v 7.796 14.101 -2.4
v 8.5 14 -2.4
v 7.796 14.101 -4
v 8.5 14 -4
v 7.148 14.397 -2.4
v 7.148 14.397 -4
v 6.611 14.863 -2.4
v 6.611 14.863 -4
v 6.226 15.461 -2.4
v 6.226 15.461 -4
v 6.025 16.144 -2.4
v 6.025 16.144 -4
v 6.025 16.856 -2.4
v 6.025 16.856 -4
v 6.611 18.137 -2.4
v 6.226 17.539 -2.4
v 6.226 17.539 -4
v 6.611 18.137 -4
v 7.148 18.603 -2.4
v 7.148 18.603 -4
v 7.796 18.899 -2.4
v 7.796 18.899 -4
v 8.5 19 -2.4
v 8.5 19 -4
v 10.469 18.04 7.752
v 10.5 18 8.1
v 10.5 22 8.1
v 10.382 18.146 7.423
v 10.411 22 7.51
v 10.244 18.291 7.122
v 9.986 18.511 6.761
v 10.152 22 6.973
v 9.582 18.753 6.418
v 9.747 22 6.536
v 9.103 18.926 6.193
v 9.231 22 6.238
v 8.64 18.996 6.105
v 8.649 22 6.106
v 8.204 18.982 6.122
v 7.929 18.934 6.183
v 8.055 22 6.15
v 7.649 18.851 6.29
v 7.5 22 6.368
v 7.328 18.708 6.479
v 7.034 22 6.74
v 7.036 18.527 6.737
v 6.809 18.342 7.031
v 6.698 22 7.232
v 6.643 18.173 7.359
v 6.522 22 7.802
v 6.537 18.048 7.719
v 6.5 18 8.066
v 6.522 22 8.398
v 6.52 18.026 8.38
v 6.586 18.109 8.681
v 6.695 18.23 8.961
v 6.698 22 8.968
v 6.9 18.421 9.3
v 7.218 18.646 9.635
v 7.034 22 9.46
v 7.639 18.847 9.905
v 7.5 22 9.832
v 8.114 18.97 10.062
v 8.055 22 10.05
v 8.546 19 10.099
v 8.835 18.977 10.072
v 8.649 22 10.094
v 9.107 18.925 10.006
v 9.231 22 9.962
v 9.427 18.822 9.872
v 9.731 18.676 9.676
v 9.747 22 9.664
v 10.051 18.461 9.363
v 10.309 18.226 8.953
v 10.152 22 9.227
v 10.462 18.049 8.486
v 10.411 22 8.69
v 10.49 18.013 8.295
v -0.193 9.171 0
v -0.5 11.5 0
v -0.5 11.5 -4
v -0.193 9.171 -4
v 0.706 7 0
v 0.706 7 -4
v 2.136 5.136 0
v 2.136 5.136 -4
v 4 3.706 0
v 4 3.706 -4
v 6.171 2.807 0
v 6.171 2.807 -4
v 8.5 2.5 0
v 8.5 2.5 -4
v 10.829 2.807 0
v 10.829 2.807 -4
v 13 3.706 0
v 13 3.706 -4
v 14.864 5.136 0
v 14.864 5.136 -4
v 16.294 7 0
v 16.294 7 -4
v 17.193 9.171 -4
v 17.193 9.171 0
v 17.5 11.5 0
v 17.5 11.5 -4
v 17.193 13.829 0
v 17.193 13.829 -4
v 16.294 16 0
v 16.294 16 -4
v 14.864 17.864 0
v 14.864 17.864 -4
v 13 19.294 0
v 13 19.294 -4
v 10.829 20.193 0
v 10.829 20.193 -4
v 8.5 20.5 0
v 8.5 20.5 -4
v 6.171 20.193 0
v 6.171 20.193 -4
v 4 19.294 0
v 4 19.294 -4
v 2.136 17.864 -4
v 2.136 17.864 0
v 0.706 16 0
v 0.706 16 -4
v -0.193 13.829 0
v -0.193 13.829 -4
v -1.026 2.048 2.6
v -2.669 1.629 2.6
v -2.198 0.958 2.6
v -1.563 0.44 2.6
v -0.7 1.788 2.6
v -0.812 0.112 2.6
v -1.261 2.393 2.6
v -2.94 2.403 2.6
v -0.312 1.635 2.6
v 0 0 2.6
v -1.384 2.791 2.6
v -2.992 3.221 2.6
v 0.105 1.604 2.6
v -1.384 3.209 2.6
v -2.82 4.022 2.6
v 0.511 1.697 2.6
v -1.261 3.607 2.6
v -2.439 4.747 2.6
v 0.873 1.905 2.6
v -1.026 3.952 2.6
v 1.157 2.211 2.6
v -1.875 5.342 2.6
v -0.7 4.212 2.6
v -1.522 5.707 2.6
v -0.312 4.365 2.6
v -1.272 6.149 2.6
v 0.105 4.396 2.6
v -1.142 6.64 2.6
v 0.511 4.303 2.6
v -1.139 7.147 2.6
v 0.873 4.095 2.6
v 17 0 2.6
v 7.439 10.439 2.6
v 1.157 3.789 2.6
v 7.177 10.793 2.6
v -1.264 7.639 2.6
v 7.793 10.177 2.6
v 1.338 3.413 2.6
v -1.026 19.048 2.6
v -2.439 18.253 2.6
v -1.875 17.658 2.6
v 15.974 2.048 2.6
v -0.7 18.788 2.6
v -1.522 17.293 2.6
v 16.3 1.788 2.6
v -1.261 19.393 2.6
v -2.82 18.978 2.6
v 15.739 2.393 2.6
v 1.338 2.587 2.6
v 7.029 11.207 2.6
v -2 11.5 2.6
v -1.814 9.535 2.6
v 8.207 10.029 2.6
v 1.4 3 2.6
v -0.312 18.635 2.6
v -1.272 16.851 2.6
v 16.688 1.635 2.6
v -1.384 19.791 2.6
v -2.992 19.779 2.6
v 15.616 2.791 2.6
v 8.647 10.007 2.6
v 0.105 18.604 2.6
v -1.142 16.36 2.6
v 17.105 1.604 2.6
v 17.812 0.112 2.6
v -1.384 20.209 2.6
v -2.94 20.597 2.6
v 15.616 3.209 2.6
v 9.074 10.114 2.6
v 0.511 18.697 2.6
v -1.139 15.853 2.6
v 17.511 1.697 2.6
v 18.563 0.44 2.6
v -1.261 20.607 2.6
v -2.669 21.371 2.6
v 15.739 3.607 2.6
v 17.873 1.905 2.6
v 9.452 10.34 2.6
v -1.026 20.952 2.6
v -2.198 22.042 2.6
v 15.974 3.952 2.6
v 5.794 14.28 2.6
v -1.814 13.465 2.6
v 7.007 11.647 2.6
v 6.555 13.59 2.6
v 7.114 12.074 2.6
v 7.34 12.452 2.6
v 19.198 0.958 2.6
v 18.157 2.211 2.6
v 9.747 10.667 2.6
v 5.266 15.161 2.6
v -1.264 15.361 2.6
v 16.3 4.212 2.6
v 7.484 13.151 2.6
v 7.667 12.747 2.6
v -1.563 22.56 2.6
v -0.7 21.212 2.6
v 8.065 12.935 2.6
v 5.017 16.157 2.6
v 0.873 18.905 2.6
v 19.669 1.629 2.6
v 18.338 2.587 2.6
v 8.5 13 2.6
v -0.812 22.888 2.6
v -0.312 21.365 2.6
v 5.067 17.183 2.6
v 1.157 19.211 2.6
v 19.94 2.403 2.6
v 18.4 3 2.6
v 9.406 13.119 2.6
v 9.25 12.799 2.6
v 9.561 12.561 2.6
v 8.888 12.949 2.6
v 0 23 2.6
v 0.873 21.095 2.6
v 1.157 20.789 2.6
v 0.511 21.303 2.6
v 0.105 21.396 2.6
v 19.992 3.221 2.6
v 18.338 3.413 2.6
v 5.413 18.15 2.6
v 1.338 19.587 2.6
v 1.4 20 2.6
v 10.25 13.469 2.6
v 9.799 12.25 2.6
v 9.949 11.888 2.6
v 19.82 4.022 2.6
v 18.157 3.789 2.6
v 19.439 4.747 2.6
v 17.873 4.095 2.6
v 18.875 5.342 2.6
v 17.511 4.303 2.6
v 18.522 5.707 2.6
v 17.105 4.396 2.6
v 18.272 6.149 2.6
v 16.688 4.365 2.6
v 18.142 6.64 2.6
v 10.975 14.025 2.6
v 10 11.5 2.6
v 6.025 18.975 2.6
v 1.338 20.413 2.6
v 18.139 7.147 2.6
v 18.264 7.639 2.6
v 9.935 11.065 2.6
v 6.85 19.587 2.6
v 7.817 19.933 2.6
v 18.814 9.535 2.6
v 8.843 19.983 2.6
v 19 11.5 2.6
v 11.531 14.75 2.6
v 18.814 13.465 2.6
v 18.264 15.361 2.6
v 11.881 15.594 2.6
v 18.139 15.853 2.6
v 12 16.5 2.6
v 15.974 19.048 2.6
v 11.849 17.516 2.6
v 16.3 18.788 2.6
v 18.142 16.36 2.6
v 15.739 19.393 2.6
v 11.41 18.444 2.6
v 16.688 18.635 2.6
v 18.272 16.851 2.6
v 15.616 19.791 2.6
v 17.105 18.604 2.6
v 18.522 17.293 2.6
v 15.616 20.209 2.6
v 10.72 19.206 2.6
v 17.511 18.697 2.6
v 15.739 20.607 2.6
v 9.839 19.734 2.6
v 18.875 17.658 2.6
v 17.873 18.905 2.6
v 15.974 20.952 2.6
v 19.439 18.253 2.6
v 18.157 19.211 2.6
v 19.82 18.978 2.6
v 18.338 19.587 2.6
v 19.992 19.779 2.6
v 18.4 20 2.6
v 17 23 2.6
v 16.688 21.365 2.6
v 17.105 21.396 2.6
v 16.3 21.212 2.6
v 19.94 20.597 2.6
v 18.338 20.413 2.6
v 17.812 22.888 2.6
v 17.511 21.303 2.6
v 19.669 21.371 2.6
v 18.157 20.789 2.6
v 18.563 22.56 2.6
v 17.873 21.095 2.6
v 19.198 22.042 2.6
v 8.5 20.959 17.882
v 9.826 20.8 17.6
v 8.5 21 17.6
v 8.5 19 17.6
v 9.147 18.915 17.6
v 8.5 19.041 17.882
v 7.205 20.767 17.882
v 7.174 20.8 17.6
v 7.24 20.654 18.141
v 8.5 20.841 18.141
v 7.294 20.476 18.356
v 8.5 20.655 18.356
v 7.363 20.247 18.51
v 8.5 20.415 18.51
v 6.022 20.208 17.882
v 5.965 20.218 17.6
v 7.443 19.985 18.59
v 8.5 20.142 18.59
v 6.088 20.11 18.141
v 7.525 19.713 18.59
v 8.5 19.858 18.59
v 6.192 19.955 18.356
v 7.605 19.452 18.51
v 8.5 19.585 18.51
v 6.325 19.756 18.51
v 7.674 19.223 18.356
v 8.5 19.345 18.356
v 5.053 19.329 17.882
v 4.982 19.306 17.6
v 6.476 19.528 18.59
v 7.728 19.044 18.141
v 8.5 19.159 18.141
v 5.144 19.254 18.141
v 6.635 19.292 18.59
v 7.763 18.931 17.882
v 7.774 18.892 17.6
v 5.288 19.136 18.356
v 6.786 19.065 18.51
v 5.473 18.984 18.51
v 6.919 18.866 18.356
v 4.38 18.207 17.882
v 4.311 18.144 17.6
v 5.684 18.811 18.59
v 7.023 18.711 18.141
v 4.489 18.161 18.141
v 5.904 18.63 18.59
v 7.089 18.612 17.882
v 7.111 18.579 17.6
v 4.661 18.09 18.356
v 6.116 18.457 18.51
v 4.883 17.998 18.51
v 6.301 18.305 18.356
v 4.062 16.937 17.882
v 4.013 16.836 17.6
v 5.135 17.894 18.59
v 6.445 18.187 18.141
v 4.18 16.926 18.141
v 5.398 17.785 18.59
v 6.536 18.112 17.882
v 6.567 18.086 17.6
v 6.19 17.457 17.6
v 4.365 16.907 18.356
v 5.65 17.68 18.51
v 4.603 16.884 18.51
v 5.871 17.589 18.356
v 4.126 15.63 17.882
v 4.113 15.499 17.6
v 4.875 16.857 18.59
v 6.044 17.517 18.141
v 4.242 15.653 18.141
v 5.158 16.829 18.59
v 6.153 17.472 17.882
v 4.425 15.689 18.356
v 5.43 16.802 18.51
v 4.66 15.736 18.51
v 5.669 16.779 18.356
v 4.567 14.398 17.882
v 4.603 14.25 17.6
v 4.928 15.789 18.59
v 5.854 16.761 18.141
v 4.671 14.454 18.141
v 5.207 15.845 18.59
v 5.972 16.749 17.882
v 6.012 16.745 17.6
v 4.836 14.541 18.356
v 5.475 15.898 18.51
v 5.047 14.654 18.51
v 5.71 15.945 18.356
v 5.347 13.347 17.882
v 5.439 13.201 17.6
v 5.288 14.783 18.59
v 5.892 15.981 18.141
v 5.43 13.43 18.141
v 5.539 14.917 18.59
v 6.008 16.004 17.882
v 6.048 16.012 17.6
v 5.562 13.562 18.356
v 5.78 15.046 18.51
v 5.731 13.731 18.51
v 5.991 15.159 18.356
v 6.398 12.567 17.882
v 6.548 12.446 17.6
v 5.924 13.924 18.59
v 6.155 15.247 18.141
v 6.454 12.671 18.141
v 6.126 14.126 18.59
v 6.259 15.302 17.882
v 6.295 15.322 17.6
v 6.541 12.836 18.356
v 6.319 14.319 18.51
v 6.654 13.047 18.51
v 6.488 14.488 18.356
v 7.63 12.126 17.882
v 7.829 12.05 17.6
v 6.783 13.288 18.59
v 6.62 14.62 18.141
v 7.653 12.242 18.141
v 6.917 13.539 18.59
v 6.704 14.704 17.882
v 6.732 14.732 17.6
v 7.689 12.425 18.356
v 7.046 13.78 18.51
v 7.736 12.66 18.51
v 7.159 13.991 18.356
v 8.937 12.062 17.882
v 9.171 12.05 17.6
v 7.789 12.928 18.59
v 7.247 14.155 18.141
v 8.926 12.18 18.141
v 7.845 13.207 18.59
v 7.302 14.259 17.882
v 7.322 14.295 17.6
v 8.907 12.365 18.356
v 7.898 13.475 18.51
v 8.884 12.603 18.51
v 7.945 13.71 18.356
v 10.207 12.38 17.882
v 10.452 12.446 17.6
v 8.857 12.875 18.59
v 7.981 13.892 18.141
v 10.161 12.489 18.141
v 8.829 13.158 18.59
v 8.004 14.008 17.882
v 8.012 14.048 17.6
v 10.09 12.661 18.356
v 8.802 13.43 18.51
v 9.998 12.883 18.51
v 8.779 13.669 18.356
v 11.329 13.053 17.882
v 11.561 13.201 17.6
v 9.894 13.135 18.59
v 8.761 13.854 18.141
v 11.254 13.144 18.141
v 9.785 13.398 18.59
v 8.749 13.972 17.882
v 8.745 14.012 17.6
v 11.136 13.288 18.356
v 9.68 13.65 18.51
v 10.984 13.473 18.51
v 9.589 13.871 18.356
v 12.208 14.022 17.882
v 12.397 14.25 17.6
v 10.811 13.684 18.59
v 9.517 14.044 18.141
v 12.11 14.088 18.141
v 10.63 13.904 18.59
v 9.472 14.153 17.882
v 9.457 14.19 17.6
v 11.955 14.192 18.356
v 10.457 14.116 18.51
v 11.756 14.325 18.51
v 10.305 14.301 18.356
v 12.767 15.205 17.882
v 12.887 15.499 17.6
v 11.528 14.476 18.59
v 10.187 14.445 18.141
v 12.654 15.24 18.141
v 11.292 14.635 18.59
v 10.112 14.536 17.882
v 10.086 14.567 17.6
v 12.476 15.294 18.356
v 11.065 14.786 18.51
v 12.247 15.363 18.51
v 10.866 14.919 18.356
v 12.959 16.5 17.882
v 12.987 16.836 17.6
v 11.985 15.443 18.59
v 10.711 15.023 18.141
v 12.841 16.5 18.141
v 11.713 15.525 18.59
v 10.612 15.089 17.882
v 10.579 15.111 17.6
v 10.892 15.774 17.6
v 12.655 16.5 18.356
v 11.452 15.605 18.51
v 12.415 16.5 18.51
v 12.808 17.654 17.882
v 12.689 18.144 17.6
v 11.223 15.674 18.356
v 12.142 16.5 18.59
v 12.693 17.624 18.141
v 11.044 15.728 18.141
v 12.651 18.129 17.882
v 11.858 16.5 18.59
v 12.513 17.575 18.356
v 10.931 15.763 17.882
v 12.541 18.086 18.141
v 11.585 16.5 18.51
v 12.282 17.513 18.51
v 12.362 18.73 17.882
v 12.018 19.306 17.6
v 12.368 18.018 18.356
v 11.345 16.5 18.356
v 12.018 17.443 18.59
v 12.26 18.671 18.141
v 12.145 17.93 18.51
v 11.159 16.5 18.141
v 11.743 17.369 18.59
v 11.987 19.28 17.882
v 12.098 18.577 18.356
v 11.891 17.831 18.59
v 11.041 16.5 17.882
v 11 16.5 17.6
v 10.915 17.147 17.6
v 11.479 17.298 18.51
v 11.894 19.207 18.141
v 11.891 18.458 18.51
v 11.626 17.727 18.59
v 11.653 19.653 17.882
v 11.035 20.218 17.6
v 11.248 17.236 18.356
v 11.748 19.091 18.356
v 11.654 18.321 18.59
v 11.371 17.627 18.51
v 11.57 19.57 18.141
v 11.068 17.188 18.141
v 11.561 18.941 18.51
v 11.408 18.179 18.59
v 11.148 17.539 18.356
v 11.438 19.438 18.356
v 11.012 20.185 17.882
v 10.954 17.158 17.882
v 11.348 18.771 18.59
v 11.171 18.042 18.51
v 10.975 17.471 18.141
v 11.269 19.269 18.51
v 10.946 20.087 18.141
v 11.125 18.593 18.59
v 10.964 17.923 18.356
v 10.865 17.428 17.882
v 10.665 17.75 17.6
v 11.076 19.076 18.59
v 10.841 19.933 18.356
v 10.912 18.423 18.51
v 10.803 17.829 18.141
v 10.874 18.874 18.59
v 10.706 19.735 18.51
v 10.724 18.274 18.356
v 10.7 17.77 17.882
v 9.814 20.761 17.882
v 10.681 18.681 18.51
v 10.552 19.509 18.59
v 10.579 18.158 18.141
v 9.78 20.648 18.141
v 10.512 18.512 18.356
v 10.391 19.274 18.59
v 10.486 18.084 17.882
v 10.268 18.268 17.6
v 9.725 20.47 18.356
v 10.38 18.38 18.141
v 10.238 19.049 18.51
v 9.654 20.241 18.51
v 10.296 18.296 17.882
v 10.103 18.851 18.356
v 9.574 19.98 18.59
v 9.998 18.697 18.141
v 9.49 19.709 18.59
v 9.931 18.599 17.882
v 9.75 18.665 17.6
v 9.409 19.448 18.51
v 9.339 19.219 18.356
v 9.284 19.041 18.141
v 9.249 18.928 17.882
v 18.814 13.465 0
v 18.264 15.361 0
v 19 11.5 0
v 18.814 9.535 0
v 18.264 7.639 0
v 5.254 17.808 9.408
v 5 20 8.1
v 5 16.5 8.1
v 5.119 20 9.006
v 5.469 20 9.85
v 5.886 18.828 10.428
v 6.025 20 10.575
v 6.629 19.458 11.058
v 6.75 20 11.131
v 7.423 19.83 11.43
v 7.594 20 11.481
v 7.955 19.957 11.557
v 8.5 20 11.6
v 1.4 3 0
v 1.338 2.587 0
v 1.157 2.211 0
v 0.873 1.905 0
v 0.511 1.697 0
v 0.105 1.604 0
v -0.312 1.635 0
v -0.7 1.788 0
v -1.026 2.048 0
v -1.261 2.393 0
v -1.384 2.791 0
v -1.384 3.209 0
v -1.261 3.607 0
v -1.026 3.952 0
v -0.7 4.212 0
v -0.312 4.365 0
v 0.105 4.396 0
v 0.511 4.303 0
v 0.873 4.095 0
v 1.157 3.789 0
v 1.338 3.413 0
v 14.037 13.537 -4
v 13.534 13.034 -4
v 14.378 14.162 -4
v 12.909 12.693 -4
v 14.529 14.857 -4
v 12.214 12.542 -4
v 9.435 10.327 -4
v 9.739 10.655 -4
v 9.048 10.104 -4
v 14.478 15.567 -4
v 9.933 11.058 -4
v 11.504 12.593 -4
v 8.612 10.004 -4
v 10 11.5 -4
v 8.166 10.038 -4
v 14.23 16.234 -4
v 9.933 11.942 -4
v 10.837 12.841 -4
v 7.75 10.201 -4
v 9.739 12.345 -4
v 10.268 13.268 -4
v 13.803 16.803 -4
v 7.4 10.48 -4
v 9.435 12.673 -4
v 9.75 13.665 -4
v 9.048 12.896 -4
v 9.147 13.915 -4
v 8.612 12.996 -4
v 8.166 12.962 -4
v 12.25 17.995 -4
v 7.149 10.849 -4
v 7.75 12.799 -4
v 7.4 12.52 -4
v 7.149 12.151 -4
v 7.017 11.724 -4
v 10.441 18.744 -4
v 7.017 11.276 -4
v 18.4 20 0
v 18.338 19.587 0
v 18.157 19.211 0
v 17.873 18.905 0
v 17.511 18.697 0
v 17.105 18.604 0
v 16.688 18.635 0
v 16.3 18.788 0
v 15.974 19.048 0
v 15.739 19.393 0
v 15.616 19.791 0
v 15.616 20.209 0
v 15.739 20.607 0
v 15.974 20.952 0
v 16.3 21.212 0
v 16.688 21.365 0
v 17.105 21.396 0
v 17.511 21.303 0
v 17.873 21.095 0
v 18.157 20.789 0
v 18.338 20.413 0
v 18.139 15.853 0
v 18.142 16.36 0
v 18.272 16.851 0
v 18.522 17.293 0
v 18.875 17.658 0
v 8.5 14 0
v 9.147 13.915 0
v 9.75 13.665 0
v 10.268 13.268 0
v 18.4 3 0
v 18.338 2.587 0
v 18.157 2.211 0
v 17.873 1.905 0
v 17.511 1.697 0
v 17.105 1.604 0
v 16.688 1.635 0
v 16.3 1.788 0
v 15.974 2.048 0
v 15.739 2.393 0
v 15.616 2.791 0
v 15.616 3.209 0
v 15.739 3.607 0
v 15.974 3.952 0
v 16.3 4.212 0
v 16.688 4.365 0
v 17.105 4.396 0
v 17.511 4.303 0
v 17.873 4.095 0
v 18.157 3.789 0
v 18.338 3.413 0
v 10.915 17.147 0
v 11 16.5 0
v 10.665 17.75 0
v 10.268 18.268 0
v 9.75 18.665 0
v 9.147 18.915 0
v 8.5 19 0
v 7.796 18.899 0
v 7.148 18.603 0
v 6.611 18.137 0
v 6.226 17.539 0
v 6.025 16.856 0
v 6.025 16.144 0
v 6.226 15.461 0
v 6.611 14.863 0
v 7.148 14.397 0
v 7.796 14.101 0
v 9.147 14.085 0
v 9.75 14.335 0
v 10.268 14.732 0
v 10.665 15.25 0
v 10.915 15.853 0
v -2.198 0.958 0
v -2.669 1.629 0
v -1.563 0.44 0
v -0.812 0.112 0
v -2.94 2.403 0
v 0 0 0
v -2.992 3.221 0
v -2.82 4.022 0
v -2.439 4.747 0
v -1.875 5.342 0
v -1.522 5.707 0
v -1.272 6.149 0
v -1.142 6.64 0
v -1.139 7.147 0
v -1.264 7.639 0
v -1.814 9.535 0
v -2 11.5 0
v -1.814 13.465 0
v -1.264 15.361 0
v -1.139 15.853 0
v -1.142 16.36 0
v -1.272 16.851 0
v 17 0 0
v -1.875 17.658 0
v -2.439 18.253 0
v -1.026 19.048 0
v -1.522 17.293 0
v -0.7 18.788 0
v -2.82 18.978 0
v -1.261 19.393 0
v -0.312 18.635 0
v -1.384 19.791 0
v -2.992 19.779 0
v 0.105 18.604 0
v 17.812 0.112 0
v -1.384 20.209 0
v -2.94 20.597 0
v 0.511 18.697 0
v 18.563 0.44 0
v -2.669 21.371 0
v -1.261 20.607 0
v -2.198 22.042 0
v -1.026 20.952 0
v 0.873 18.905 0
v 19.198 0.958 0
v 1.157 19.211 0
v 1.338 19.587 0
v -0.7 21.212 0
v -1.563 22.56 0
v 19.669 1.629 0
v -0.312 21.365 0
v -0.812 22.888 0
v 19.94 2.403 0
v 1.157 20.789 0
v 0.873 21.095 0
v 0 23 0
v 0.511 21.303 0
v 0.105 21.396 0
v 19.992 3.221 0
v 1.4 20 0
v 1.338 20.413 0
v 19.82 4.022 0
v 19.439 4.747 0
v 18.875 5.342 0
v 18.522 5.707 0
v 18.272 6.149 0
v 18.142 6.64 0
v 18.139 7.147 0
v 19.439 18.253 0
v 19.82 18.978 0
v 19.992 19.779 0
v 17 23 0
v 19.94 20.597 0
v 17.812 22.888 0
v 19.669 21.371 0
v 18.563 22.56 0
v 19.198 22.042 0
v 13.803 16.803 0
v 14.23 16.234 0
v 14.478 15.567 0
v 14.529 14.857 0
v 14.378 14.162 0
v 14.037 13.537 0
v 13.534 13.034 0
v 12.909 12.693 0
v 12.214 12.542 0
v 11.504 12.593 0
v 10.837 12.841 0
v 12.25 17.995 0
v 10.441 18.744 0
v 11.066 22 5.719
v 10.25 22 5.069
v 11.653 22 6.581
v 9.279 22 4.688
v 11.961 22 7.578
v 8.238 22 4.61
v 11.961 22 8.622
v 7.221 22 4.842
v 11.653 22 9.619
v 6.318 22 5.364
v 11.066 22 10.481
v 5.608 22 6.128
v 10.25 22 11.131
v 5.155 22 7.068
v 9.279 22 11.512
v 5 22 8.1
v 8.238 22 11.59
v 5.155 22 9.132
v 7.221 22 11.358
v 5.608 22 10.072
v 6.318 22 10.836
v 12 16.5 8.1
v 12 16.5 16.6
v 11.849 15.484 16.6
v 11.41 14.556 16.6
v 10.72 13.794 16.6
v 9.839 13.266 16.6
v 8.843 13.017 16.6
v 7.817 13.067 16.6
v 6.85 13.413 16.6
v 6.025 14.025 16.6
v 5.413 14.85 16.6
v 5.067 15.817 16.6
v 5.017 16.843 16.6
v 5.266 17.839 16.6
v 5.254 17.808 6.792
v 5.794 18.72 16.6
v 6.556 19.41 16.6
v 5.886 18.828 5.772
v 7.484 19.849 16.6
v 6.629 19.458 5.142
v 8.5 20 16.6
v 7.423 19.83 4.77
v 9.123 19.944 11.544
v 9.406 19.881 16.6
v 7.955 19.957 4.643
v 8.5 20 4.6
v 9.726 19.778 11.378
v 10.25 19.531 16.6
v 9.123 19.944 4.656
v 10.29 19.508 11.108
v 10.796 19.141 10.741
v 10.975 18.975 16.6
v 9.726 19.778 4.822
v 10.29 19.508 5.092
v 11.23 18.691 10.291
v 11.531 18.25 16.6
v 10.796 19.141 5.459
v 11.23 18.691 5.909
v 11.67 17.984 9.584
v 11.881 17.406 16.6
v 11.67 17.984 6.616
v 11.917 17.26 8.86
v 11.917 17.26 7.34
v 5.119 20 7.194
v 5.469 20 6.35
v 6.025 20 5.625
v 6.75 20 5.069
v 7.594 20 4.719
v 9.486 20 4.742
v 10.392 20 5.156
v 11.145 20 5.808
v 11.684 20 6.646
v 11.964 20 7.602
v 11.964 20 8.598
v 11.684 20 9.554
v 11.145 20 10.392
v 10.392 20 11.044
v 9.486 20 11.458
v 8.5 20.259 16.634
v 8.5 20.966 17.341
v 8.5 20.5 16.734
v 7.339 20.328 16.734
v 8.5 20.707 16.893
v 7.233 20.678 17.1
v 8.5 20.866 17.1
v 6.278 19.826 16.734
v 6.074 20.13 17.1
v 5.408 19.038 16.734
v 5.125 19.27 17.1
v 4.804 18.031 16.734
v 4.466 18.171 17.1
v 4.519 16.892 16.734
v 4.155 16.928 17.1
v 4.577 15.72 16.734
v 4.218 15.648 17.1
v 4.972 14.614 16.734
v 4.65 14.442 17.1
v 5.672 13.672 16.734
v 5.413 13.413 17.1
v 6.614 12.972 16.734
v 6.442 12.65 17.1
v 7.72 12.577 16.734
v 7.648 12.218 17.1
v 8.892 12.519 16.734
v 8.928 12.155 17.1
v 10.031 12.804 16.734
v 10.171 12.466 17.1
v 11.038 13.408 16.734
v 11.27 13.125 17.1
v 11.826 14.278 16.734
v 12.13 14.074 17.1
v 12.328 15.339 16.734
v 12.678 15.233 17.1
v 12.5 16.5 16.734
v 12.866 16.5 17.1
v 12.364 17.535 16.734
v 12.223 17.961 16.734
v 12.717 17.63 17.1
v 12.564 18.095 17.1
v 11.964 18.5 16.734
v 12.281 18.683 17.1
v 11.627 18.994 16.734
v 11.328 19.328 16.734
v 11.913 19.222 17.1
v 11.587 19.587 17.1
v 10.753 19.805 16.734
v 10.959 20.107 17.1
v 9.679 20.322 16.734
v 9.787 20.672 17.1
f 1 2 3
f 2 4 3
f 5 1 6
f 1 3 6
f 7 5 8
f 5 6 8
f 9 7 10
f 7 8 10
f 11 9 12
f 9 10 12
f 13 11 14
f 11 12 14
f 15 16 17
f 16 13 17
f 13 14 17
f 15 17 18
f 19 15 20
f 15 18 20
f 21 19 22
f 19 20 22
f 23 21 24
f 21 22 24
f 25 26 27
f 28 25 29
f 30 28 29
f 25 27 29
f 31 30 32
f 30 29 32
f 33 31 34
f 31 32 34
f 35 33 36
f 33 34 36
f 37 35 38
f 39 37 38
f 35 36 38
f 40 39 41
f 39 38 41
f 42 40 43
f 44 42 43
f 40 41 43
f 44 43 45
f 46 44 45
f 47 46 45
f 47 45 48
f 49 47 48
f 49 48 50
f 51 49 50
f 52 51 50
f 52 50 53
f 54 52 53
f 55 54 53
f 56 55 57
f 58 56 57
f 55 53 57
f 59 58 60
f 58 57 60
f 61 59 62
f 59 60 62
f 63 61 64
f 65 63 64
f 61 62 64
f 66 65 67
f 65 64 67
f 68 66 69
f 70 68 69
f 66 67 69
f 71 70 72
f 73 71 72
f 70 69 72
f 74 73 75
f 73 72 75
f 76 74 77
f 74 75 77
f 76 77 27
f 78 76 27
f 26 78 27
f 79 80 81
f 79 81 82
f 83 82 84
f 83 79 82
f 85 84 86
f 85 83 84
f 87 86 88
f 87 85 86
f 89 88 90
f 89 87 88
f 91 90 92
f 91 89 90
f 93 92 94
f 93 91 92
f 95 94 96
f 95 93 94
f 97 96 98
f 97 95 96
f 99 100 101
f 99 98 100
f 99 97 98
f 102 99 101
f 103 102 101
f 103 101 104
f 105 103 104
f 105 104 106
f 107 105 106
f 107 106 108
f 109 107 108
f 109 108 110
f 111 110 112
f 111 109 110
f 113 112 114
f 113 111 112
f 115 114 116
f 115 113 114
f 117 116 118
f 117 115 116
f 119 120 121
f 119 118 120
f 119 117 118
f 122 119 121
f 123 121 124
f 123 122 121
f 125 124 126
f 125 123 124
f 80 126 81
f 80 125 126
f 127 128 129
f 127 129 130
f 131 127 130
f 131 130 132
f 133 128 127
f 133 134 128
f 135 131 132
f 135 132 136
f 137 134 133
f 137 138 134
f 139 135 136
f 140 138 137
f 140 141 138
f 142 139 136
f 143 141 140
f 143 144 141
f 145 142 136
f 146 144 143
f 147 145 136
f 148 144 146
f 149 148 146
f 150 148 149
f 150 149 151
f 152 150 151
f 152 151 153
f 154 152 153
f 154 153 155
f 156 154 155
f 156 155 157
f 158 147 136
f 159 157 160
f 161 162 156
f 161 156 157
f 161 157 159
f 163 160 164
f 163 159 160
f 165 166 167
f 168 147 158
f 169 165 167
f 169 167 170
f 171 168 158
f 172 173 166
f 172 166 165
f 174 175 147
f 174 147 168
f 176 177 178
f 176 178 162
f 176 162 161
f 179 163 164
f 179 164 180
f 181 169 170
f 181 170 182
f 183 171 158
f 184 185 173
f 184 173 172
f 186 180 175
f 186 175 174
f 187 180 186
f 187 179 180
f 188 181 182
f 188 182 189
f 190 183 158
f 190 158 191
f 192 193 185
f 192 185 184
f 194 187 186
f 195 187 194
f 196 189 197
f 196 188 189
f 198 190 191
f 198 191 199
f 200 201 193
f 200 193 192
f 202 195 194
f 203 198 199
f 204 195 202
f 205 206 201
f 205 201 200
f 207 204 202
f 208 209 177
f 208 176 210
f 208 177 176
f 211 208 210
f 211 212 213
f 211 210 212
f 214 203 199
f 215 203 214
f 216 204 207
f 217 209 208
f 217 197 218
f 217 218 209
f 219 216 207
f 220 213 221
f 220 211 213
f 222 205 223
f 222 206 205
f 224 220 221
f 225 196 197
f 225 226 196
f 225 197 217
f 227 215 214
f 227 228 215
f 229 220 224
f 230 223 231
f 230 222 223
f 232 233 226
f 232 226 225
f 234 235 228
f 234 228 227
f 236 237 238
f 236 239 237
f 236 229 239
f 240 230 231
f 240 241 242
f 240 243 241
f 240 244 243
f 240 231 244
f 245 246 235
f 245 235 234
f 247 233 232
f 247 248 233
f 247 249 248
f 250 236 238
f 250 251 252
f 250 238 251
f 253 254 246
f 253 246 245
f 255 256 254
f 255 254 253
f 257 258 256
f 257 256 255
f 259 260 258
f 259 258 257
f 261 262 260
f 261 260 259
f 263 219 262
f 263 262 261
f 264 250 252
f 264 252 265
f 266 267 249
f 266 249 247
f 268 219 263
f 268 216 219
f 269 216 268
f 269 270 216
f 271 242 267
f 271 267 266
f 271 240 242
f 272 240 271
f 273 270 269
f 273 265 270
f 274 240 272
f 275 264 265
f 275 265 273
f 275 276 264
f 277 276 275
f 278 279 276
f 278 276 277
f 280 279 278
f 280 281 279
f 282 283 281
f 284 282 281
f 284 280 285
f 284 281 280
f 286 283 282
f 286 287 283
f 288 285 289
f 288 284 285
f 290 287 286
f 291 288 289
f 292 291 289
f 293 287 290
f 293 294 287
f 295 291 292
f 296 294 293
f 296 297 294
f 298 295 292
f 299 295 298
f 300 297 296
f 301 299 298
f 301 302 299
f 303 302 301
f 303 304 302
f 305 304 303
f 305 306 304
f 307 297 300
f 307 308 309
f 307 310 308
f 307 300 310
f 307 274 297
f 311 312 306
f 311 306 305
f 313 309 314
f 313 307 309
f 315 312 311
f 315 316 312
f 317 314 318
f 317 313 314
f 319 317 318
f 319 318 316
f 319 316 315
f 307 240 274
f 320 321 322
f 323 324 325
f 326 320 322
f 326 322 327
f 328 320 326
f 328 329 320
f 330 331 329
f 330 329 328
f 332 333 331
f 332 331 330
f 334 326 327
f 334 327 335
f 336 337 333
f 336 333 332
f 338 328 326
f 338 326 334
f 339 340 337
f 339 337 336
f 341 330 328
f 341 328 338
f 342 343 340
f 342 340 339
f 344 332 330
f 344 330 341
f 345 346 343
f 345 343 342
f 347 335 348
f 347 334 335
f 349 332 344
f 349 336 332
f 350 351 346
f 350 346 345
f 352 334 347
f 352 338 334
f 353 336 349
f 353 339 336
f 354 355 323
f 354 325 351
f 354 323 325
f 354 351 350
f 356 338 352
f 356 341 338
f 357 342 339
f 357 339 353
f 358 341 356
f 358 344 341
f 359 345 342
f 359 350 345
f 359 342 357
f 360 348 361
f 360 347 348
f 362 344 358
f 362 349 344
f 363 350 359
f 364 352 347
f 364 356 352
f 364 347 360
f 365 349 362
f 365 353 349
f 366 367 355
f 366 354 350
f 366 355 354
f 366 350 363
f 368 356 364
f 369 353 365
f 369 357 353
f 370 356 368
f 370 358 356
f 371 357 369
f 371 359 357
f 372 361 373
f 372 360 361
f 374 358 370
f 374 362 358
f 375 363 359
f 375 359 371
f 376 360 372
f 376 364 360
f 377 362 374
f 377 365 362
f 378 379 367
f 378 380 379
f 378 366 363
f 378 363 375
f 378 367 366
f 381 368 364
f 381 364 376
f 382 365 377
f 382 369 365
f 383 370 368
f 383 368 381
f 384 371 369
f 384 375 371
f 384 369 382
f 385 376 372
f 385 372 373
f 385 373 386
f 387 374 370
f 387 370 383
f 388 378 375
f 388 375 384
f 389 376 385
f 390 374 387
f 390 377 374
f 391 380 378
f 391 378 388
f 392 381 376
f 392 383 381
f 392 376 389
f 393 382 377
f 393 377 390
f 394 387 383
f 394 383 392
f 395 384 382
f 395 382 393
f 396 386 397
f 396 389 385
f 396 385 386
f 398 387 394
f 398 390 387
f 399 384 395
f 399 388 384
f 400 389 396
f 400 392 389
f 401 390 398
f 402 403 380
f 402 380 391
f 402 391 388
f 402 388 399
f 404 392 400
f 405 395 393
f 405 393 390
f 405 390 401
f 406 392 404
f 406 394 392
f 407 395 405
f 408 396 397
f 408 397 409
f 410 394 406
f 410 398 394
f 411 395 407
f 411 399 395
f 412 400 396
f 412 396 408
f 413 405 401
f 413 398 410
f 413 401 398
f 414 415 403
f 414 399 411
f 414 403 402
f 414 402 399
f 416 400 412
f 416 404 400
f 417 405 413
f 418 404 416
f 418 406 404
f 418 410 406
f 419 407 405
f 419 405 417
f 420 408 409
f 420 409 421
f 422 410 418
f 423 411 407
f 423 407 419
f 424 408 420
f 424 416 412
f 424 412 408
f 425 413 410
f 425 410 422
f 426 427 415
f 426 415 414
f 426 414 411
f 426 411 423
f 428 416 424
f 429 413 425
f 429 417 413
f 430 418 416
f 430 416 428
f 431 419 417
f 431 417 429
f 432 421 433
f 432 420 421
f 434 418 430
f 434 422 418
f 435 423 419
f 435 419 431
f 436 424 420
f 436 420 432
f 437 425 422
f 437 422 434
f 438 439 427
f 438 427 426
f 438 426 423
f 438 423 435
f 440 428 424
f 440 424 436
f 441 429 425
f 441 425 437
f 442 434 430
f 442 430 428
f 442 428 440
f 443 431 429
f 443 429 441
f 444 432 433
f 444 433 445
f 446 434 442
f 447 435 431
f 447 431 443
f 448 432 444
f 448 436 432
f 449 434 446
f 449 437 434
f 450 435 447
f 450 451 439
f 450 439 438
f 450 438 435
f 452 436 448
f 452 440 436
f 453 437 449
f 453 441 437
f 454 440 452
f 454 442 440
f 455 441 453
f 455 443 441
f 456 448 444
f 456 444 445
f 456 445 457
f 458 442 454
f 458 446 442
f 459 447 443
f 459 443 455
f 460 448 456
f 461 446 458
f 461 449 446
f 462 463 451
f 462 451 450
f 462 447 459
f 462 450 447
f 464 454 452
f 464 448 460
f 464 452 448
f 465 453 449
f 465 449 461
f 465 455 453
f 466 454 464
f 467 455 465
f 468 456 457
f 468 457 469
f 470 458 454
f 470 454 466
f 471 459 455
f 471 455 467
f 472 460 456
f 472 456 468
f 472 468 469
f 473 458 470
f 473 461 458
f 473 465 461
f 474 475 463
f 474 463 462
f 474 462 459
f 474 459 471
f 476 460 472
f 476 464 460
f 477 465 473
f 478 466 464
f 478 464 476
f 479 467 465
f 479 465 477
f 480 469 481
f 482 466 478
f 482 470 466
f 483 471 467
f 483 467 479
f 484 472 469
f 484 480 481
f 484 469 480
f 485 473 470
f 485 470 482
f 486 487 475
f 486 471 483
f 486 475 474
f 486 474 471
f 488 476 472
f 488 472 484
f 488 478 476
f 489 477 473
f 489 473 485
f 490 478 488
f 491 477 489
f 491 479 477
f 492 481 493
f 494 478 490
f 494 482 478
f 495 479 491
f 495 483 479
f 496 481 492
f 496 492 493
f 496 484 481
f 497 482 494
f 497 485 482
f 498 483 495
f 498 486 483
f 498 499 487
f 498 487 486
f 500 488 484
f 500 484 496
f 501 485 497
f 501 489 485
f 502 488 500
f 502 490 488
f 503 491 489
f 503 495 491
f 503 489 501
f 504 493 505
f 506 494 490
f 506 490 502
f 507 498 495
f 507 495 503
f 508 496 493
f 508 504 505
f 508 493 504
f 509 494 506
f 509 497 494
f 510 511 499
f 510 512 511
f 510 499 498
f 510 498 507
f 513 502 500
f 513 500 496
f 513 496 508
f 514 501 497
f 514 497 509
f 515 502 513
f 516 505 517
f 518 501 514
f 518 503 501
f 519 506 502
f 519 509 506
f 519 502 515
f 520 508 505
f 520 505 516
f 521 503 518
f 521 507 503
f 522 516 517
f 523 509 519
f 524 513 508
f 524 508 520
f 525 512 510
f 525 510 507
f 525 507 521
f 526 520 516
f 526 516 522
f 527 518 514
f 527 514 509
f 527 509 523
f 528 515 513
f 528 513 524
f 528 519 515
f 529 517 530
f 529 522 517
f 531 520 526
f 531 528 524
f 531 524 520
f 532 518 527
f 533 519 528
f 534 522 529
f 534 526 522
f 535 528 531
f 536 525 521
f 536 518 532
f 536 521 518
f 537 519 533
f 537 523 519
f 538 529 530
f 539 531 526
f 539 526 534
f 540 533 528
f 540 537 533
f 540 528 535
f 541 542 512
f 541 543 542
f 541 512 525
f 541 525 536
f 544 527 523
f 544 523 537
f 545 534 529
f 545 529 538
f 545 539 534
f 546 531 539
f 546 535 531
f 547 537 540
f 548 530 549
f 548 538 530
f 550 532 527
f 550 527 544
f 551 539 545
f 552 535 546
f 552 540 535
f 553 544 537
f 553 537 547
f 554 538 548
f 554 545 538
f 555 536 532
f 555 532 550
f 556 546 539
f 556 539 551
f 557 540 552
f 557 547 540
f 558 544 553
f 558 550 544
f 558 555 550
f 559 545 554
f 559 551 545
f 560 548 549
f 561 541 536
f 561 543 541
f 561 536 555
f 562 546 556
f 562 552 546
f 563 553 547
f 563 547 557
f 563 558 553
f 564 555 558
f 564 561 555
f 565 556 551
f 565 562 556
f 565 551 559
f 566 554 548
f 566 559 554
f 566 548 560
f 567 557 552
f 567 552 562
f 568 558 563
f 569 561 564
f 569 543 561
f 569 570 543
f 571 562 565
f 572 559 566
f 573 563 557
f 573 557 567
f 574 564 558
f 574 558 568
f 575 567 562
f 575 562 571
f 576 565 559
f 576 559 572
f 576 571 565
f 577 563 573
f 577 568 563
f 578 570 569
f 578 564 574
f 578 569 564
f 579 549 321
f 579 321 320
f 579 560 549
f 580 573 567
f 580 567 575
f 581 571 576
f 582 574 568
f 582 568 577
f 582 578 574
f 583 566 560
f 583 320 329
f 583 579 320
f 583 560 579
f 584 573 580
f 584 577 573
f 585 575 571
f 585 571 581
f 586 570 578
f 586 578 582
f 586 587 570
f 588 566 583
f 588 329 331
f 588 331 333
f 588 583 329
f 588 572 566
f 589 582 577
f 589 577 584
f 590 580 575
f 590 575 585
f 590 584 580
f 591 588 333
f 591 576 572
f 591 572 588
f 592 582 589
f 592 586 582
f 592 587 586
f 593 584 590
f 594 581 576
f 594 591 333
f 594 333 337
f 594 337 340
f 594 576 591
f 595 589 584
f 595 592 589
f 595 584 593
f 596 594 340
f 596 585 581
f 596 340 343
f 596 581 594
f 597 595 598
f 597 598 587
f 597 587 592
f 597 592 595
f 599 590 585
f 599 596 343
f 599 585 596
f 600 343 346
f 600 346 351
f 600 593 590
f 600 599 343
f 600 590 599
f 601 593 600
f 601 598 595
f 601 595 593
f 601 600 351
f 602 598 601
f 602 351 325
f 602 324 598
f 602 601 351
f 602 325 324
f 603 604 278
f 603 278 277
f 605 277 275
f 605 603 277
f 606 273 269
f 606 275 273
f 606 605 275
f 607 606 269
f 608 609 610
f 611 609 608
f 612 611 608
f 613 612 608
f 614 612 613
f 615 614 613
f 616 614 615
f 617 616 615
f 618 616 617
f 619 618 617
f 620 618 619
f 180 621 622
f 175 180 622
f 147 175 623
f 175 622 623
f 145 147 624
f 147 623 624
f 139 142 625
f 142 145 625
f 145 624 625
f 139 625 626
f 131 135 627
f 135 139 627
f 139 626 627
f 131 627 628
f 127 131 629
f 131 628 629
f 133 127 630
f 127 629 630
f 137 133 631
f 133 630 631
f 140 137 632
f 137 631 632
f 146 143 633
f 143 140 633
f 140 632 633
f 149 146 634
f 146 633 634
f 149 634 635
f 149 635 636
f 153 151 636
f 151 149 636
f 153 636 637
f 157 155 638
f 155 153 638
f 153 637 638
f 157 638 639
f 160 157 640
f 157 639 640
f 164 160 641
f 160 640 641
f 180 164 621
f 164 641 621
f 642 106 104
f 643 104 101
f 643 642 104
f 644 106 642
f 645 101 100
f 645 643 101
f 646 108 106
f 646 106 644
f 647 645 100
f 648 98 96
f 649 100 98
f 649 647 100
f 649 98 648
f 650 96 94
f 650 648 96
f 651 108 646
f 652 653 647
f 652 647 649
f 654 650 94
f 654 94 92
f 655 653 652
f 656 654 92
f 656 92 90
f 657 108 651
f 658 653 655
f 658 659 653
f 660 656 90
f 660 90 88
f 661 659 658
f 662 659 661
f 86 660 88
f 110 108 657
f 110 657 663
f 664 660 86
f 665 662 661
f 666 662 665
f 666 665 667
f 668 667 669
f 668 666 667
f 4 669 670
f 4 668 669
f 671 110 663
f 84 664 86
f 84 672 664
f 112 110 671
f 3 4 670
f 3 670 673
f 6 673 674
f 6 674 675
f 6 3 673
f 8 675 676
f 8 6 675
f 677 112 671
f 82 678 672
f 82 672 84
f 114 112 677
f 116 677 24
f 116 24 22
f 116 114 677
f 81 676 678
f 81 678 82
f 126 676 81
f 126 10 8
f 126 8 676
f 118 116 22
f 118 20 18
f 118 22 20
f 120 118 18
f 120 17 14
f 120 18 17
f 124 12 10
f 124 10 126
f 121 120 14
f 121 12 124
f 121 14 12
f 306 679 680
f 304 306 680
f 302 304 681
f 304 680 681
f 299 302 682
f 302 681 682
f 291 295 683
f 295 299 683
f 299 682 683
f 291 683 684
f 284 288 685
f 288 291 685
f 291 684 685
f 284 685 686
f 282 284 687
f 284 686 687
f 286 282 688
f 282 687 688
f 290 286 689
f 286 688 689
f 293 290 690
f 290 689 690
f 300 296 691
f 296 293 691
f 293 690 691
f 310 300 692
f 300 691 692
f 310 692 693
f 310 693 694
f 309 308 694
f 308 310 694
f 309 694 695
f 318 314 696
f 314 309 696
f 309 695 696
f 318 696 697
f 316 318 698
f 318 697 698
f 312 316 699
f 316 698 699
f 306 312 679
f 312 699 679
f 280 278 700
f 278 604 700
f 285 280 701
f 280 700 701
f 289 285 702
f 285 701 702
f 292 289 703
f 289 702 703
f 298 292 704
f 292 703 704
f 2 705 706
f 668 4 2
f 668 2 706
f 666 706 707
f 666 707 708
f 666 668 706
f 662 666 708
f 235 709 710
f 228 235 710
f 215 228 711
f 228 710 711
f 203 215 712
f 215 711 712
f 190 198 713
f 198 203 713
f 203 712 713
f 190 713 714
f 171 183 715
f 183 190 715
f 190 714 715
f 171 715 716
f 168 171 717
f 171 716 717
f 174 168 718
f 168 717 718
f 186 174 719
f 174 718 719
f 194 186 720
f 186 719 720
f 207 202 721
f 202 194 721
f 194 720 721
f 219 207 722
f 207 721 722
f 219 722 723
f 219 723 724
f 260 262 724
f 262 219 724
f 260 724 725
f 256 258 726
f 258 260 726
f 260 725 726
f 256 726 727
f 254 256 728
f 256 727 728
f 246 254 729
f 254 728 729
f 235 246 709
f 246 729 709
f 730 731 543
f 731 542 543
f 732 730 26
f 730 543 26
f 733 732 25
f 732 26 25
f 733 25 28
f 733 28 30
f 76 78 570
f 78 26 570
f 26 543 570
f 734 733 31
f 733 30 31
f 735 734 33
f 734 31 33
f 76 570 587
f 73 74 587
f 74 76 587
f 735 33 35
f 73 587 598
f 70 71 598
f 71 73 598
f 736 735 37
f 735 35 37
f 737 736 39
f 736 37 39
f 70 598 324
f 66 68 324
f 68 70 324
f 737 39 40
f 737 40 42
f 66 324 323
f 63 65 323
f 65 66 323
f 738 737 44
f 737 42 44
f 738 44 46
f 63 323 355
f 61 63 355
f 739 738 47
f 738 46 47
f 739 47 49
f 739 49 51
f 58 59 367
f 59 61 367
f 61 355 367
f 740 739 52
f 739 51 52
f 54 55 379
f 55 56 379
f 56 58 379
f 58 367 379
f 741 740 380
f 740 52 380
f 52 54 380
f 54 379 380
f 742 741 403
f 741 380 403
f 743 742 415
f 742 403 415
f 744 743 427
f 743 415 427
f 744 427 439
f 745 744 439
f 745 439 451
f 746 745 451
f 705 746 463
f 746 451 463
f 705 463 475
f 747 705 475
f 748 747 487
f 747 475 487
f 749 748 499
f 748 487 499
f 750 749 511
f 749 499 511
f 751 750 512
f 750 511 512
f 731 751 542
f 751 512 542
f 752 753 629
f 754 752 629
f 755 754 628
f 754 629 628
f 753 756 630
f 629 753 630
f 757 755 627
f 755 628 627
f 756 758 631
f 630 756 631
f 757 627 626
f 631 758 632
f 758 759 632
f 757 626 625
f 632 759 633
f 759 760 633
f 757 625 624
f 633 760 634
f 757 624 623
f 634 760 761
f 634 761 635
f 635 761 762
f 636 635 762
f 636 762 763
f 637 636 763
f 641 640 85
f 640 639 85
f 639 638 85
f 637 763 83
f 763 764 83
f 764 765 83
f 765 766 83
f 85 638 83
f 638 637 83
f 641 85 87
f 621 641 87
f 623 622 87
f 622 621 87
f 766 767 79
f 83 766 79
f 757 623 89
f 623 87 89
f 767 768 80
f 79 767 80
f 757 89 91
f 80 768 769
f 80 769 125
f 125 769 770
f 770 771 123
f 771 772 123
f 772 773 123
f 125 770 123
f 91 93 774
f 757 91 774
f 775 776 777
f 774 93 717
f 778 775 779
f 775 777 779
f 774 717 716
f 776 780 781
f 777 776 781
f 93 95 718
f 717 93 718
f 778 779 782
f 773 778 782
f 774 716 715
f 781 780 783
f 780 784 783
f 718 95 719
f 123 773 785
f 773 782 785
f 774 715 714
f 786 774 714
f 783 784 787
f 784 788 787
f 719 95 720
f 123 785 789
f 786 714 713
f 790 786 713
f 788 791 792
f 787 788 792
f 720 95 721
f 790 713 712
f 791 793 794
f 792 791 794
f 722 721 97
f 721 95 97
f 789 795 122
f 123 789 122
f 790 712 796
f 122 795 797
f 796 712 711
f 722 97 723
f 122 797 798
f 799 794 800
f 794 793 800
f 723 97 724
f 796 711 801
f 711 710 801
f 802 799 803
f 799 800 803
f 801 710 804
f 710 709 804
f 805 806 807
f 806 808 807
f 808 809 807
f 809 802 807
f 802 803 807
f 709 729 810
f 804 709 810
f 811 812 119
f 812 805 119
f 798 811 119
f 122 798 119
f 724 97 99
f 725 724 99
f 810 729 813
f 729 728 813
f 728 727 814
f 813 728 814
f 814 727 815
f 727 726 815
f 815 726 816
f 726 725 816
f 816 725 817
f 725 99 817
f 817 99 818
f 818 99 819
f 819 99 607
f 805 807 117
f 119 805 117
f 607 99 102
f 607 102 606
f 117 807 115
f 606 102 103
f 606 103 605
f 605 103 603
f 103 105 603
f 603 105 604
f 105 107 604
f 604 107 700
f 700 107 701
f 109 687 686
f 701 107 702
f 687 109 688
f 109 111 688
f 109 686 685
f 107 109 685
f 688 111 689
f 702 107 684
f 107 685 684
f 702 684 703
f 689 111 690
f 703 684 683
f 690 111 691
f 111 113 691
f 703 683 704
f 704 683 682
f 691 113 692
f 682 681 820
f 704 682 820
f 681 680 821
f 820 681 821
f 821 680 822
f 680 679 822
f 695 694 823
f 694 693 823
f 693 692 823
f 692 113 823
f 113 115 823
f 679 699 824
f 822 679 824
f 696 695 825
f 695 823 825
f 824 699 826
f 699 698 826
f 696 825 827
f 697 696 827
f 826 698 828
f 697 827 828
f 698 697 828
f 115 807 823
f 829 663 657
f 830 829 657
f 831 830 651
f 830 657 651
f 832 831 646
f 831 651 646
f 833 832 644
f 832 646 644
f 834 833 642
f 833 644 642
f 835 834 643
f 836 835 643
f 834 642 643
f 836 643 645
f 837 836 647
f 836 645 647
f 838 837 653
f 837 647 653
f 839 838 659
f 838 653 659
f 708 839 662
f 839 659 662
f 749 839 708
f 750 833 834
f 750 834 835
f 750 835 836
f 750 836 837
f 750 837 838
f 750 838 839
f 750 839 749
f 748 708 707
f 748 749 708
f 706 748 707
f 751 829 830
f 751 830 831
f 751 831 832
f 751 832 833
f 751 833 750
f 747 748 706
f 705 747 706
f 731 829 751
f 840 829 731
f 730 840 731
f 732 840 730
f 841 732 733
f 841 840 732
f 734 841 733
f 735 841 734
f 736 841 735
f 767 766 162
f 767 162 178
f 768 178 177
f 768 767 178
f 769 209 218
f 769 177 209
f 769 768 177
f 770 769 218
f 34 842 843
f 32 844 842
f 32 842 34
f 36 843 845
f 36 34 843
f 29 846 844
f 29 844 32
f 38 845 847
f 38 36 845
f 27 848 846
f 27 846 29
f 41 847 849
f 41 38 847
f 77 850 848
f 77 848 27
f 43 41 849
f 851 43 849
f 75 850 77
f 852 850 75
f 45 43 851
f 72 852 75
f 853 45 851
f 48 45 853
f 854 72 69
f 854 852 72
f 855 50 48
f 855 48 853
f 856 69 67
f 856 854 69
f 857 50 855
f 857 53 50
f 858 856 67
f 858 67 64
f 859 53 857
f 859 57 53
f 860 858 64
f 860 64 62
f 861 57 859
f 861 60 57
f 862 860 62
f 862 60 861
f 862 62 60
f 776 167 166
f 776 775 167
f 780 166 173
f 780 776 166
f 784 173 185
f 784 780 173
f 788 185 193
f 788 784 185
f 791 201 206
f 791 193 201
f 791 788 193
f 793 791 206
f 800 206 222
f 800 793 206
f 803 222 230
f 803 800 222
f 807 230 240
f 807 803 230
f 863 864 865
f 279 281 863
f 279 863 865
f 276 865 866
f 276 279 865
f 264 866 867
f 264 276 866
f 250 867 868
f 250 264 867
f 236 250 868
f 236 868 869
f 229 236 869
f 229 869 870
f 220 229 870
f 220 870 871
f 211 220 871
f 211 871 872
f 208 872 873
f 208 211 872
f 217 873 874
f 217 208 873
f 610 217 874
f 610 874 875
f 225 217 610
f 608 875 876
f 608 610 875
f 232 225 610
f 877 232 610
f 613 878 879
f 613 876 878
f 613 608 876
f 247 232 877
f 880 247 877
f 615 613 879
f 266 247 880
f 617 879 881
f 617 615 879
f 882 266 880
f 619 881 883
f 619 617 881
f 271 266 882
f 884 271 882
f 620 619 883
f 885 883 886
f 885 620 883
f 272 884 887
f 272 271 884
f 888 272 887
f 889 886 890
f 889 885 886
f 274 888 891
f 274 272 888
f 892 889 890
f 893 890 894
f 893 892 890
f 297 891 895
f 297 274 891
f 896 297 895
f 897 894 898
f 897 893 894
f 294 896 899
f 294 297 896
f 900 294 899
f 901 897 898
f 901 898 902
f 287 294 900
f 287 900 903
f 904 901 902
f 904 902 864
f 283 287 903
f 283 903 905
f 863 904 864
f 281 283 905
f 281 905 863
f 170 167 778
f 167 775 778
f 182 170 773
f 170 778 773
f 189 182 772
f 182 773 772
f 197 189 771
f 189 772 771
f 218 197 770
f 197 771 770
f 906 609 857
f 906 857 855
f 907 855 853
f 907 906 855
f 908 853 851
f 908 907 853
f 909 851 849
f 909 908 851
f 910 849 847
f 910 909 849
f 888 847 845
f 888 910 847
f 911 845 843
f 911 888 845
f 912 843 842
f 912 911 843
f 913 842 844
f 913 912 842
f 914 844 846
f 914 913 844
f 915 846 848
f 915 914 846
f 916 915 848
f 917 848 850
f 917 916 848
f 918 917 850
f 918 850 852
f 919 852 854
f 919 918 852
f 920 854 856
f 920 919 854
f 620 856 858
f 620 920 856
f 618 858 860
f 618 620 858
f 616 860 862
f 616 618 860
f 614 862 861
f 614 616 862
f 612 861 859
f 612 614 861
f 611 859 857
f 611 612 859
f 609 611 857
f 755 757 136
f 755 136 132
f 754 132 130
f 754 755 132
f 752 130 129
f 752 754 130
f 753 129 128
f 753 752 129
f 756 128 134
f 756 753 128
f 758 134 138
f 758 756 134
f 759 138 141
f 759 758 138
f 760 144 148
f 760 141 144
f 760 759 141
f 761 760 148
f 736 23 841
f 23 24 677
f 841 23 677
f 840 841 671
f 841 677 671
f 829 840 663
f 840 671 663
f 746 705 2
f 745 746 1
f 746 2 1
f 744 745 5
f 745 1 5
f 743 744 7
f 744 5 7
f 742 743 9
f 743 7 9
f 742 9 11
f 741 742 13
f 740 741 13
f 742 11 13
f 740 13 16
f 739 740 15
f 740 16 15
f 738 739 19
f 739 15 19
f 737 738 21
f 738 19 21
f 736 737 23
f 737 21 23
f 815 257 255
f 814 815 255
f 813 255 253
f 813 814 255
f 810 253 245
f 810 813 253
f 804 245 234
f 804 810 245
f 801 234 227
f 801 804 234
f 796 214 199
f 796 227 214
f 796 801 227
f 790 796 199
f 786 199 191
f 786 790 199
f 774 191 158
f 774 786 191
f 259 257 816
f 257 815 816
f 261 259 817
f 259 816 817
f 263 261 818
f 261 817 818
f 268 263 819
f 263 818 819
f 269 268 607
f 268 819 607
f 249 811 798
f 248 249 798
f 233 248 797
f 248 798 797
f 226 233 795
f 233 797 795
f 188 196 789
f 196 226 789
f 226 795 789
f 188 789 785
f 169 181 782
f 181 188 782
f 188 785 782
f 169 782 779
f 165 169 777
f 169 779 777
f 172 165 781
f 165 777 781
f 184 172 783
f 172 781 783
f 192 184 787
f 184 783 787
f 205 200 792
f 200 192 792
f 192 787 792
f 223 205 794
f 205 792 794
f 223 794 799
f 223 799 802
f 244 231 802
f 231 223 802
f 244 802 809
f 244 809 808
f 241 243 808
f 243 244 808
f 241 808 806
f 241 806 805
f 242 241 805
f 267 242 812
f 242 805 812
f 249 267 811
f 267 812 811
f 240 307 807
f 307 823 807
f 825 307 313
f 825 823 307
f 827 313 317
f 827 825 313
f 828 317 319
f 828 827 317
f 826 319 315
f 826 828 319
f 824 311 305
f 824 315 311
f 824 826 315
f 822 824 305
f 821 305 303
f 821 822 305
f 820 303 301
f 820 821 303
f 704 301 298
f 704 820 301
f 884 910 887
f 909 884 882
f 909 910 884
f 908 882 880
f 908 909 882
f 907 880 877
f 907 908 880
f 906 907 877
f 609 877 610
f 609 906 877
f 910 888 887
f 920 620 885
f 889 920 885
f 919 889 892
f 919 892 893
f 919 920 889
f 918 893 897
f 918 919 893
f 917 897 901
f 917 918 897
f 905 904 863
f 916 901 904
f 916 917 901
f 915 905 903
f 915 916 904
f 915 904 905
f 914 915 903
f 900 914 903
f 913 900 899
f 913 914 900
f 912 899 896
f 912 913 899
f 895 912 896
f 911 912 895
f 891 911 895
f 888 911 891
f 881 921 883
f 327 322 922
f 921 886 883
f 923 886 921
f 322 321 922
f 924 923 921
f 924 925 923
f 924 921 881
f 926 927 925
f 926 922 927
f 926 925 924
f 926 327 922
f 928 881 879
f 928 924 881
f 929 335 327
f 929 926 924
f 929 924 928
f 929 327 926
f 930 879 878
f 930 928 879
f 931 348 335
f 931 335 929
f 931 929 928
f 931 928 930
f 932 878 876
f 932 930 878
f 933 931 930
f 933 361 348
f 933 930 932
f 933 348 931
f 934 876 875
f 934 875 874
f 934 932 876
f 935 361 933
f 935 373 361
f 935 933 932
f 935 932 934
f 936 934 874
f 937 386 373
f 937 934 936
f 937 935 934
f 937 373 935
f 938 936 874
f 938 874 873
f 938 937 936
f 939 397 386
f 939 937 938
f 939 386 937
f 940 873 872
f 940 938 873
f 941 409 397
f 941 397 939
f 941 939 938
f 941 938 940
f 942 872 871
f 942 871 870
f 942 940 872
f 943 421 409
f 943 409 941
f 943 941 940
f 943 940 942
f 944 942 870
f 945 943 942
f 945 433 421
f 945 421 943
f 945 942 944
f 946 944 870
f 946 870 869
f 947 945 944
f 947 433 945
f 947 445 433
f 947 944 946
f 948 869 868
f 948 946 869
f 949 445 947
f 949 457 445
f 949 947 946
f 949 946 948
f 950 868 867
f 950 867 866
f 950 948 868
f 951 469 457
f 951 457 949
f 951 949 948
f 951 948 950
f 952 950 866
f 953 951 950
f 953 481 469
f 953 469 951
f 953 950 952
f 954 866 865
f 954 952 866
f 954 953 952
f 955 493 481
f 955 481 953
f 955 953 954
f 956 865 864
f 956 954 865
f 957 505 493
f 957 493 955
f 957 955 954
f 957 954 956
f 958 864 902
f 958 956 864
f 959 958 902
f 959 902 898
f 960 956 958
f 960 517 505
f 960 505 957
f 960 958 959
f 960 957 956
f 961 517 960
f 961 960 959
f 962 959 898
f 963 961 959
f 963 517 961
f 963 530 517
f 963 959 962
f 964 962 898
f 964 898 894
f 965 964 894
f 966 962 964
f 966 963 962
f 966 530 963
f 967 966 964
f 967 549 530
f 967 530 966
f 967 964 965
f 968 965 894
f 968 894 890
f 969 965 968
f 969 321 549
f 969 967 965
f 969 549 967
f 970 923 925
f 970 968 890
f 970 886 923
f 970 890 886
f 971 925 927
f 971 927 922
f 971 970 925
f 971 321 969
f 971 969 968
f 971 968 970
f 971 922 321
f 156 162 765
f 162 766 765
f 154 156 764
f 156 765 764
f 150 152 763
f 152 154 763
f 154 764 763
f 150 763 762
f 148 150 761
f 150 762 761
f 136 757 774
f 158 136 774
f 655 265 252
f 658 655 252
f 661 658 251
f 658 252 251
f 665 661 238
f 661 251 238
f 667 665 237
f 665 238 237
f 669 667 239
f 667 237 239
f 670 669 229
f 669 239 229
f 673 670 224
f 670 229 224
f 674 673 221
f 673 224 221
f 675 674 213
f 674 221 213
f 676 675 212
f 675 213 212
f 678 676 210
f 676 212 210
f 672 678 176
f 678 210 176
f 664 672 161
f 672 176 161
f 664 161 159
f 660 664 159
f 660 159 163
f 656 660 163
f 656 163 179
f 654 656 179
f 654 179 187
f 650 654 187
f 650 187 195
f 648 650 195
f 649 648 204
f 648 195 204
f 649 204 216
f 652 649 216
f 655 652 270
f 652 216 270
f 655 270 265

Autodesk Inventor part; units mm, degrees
ref_plane "XY Plane" through (0, 0, 0) normal (0, 0, 1) x (1, 0, 0)
sketch "Sketch1" plane through (0, 0, 0) normal (0, 0, 1) x (1, 0, 0)
  circle A0 centre (17, 3) radius 1.4
  circle A1 centre (0, 20) radius 1.4
  circle A2 centre (17, 20) radius 1.4
  circle A3 centre (0, 3) radius 1.4
  arc A4 (-1.2644, 15.3609) -> (-1.2644, 7.6391) centre (8.5, 11.5) ccw
  arc A5 (-1.8746, 5.3422) -> (-1.2644, 7.6391) centre (-3.1243, 6.9037) ccw
  arc A6 (-1.8746, 5.3422) -> (0, 0) centre (0, 3) ccw
  line L0 (0, 0) -> (17, 0)
  arc A7 (17, 0) -> (18.8746, 5.3422) centre (17, 3) ccw
  arc A8 (18.2644, 7.6391) -> (18.8746, 5.3422) centre (20.1243, 6.9037) ccw
  arc A9 (18.2644, 7.6391) -> (18.2644, 15.3609) centre (8.5, 11.5) ccw
  arc A10 (18.8746, 17.6578) -> (18.2644, 15.3609) centre (20.1243, 16.0963) ccw
  arc A11 (18.8746, 17.6578) -> (17, 23) centre (17, 20) ccw
  line L1 (17, 23) -> (0, 23)
  arc A12 (0, 23) -> (-1.8746, 17.6578) centre (0, 20) ccw
  arc A13 (-1.2644, 15.3609) -> (-1.8746, 17.6578) centre (-3.1243, 16.0963) ccw
extrude "Extrusion1" add sketch "Sketch1" along normal blind 2.6
sketch "Sketch2" plane through (0, 0, 0) normal (0, 0, -1) x (-1, 0, 0)
  circle A0 centre (-8.5, 11.5) radius 9
extrude "Extrusion2" add sketch "Sketch2" along normal blind 4
sketch "Sketch3" plane through (8.5, 11.5, -4) normal (0, 0, -1) x (-1, 0, 0)
  arc A0 (0, 7.5) -> (-5.3033, 5.3033) centre (0, 0) ccw
  arc A1 (0, 2.5) -> (0, 7.5) centre (0, 5) ccw
  arc A2 (0, 2.5) -> (-1.7678, 1.7678) centre (0, 0) ccw
  arc A3 (-5.3033, 5.3033) -> (-1.7678, 1.7678) centre (-3.5355, 3.5355) ccw
extrude "Extrusion3" cut sketch "Sketch3" against normal blind 4
sketch "Sketch4" plane through (0, 0, 2.6) normal (0, 0, 1) x (1, 0, 0)
  circle A0 centre (8.5, 16.5) radius 3.5
extrude "Extrusion4" add sketch "Sketch4" along normal blind 15
ref_plane "Work Plane1" through (8.5, 0, 0) normal (1, 0, 0) x (0, 1, 0)
sketch "Sketch6" plane through (8.5, 0, 0) normal (1, 0, 0) x (0, 1, 0)
  circle A0 centre (20, 17.6) radius 1
  line L0 (16.5, 17.6) -> (16.5, 21.4909) construction
revolve "Revolution1" add sketch "Sketch6" angle 360 about axis through (8.5, 16.5, 17.6) along (0, 0, 1)
ref_plane "Work Plane2" through (0, 20, 0) normal (0, 1, 0) x (-1, 0, 0)
sketch "Sketch7" plane through (0, 20, 0) normal (0, 1, 0) x (-1, 0, 0)
  circle A0 centre (-8.5, 8.1) radius 3.5
extrude "Extrusion6" add sketch "Sketch7" along normal blind 2 and the other way blind 3.5
sketch "Sketch8" plane through (8.5, 16.5, 17.6) normal (0, 0, 1) x (1, 0, 0)
  circle A0 centre (0, 0) radius 2.5 projected
extrude "Extrusion8" cut sketch "Sketch8" against normal blind 20
sketch "Sketch9" plane through (8.5, 22, 8.1) normal (0, 1, 0) x (1, 0, 0)
  circle A0 centre (0, 0) radius 2
extrude "Extrusion9" cut sketch "Sketch9" against normal blind 5
thread "Thread1" size "M4x0.5" class "6H" standard "ISO Metric profile" full length
sketch "Sketch10" plane through (0, 0, 2.6) normal (0, 0, 1) x (1, 0, 0)
  circle A0 centre (8.5, 11.5) radius 1.5
extrude "Extrusion10" cut sketch "Sketch10" against normal blind 10
properties part number "cover"
